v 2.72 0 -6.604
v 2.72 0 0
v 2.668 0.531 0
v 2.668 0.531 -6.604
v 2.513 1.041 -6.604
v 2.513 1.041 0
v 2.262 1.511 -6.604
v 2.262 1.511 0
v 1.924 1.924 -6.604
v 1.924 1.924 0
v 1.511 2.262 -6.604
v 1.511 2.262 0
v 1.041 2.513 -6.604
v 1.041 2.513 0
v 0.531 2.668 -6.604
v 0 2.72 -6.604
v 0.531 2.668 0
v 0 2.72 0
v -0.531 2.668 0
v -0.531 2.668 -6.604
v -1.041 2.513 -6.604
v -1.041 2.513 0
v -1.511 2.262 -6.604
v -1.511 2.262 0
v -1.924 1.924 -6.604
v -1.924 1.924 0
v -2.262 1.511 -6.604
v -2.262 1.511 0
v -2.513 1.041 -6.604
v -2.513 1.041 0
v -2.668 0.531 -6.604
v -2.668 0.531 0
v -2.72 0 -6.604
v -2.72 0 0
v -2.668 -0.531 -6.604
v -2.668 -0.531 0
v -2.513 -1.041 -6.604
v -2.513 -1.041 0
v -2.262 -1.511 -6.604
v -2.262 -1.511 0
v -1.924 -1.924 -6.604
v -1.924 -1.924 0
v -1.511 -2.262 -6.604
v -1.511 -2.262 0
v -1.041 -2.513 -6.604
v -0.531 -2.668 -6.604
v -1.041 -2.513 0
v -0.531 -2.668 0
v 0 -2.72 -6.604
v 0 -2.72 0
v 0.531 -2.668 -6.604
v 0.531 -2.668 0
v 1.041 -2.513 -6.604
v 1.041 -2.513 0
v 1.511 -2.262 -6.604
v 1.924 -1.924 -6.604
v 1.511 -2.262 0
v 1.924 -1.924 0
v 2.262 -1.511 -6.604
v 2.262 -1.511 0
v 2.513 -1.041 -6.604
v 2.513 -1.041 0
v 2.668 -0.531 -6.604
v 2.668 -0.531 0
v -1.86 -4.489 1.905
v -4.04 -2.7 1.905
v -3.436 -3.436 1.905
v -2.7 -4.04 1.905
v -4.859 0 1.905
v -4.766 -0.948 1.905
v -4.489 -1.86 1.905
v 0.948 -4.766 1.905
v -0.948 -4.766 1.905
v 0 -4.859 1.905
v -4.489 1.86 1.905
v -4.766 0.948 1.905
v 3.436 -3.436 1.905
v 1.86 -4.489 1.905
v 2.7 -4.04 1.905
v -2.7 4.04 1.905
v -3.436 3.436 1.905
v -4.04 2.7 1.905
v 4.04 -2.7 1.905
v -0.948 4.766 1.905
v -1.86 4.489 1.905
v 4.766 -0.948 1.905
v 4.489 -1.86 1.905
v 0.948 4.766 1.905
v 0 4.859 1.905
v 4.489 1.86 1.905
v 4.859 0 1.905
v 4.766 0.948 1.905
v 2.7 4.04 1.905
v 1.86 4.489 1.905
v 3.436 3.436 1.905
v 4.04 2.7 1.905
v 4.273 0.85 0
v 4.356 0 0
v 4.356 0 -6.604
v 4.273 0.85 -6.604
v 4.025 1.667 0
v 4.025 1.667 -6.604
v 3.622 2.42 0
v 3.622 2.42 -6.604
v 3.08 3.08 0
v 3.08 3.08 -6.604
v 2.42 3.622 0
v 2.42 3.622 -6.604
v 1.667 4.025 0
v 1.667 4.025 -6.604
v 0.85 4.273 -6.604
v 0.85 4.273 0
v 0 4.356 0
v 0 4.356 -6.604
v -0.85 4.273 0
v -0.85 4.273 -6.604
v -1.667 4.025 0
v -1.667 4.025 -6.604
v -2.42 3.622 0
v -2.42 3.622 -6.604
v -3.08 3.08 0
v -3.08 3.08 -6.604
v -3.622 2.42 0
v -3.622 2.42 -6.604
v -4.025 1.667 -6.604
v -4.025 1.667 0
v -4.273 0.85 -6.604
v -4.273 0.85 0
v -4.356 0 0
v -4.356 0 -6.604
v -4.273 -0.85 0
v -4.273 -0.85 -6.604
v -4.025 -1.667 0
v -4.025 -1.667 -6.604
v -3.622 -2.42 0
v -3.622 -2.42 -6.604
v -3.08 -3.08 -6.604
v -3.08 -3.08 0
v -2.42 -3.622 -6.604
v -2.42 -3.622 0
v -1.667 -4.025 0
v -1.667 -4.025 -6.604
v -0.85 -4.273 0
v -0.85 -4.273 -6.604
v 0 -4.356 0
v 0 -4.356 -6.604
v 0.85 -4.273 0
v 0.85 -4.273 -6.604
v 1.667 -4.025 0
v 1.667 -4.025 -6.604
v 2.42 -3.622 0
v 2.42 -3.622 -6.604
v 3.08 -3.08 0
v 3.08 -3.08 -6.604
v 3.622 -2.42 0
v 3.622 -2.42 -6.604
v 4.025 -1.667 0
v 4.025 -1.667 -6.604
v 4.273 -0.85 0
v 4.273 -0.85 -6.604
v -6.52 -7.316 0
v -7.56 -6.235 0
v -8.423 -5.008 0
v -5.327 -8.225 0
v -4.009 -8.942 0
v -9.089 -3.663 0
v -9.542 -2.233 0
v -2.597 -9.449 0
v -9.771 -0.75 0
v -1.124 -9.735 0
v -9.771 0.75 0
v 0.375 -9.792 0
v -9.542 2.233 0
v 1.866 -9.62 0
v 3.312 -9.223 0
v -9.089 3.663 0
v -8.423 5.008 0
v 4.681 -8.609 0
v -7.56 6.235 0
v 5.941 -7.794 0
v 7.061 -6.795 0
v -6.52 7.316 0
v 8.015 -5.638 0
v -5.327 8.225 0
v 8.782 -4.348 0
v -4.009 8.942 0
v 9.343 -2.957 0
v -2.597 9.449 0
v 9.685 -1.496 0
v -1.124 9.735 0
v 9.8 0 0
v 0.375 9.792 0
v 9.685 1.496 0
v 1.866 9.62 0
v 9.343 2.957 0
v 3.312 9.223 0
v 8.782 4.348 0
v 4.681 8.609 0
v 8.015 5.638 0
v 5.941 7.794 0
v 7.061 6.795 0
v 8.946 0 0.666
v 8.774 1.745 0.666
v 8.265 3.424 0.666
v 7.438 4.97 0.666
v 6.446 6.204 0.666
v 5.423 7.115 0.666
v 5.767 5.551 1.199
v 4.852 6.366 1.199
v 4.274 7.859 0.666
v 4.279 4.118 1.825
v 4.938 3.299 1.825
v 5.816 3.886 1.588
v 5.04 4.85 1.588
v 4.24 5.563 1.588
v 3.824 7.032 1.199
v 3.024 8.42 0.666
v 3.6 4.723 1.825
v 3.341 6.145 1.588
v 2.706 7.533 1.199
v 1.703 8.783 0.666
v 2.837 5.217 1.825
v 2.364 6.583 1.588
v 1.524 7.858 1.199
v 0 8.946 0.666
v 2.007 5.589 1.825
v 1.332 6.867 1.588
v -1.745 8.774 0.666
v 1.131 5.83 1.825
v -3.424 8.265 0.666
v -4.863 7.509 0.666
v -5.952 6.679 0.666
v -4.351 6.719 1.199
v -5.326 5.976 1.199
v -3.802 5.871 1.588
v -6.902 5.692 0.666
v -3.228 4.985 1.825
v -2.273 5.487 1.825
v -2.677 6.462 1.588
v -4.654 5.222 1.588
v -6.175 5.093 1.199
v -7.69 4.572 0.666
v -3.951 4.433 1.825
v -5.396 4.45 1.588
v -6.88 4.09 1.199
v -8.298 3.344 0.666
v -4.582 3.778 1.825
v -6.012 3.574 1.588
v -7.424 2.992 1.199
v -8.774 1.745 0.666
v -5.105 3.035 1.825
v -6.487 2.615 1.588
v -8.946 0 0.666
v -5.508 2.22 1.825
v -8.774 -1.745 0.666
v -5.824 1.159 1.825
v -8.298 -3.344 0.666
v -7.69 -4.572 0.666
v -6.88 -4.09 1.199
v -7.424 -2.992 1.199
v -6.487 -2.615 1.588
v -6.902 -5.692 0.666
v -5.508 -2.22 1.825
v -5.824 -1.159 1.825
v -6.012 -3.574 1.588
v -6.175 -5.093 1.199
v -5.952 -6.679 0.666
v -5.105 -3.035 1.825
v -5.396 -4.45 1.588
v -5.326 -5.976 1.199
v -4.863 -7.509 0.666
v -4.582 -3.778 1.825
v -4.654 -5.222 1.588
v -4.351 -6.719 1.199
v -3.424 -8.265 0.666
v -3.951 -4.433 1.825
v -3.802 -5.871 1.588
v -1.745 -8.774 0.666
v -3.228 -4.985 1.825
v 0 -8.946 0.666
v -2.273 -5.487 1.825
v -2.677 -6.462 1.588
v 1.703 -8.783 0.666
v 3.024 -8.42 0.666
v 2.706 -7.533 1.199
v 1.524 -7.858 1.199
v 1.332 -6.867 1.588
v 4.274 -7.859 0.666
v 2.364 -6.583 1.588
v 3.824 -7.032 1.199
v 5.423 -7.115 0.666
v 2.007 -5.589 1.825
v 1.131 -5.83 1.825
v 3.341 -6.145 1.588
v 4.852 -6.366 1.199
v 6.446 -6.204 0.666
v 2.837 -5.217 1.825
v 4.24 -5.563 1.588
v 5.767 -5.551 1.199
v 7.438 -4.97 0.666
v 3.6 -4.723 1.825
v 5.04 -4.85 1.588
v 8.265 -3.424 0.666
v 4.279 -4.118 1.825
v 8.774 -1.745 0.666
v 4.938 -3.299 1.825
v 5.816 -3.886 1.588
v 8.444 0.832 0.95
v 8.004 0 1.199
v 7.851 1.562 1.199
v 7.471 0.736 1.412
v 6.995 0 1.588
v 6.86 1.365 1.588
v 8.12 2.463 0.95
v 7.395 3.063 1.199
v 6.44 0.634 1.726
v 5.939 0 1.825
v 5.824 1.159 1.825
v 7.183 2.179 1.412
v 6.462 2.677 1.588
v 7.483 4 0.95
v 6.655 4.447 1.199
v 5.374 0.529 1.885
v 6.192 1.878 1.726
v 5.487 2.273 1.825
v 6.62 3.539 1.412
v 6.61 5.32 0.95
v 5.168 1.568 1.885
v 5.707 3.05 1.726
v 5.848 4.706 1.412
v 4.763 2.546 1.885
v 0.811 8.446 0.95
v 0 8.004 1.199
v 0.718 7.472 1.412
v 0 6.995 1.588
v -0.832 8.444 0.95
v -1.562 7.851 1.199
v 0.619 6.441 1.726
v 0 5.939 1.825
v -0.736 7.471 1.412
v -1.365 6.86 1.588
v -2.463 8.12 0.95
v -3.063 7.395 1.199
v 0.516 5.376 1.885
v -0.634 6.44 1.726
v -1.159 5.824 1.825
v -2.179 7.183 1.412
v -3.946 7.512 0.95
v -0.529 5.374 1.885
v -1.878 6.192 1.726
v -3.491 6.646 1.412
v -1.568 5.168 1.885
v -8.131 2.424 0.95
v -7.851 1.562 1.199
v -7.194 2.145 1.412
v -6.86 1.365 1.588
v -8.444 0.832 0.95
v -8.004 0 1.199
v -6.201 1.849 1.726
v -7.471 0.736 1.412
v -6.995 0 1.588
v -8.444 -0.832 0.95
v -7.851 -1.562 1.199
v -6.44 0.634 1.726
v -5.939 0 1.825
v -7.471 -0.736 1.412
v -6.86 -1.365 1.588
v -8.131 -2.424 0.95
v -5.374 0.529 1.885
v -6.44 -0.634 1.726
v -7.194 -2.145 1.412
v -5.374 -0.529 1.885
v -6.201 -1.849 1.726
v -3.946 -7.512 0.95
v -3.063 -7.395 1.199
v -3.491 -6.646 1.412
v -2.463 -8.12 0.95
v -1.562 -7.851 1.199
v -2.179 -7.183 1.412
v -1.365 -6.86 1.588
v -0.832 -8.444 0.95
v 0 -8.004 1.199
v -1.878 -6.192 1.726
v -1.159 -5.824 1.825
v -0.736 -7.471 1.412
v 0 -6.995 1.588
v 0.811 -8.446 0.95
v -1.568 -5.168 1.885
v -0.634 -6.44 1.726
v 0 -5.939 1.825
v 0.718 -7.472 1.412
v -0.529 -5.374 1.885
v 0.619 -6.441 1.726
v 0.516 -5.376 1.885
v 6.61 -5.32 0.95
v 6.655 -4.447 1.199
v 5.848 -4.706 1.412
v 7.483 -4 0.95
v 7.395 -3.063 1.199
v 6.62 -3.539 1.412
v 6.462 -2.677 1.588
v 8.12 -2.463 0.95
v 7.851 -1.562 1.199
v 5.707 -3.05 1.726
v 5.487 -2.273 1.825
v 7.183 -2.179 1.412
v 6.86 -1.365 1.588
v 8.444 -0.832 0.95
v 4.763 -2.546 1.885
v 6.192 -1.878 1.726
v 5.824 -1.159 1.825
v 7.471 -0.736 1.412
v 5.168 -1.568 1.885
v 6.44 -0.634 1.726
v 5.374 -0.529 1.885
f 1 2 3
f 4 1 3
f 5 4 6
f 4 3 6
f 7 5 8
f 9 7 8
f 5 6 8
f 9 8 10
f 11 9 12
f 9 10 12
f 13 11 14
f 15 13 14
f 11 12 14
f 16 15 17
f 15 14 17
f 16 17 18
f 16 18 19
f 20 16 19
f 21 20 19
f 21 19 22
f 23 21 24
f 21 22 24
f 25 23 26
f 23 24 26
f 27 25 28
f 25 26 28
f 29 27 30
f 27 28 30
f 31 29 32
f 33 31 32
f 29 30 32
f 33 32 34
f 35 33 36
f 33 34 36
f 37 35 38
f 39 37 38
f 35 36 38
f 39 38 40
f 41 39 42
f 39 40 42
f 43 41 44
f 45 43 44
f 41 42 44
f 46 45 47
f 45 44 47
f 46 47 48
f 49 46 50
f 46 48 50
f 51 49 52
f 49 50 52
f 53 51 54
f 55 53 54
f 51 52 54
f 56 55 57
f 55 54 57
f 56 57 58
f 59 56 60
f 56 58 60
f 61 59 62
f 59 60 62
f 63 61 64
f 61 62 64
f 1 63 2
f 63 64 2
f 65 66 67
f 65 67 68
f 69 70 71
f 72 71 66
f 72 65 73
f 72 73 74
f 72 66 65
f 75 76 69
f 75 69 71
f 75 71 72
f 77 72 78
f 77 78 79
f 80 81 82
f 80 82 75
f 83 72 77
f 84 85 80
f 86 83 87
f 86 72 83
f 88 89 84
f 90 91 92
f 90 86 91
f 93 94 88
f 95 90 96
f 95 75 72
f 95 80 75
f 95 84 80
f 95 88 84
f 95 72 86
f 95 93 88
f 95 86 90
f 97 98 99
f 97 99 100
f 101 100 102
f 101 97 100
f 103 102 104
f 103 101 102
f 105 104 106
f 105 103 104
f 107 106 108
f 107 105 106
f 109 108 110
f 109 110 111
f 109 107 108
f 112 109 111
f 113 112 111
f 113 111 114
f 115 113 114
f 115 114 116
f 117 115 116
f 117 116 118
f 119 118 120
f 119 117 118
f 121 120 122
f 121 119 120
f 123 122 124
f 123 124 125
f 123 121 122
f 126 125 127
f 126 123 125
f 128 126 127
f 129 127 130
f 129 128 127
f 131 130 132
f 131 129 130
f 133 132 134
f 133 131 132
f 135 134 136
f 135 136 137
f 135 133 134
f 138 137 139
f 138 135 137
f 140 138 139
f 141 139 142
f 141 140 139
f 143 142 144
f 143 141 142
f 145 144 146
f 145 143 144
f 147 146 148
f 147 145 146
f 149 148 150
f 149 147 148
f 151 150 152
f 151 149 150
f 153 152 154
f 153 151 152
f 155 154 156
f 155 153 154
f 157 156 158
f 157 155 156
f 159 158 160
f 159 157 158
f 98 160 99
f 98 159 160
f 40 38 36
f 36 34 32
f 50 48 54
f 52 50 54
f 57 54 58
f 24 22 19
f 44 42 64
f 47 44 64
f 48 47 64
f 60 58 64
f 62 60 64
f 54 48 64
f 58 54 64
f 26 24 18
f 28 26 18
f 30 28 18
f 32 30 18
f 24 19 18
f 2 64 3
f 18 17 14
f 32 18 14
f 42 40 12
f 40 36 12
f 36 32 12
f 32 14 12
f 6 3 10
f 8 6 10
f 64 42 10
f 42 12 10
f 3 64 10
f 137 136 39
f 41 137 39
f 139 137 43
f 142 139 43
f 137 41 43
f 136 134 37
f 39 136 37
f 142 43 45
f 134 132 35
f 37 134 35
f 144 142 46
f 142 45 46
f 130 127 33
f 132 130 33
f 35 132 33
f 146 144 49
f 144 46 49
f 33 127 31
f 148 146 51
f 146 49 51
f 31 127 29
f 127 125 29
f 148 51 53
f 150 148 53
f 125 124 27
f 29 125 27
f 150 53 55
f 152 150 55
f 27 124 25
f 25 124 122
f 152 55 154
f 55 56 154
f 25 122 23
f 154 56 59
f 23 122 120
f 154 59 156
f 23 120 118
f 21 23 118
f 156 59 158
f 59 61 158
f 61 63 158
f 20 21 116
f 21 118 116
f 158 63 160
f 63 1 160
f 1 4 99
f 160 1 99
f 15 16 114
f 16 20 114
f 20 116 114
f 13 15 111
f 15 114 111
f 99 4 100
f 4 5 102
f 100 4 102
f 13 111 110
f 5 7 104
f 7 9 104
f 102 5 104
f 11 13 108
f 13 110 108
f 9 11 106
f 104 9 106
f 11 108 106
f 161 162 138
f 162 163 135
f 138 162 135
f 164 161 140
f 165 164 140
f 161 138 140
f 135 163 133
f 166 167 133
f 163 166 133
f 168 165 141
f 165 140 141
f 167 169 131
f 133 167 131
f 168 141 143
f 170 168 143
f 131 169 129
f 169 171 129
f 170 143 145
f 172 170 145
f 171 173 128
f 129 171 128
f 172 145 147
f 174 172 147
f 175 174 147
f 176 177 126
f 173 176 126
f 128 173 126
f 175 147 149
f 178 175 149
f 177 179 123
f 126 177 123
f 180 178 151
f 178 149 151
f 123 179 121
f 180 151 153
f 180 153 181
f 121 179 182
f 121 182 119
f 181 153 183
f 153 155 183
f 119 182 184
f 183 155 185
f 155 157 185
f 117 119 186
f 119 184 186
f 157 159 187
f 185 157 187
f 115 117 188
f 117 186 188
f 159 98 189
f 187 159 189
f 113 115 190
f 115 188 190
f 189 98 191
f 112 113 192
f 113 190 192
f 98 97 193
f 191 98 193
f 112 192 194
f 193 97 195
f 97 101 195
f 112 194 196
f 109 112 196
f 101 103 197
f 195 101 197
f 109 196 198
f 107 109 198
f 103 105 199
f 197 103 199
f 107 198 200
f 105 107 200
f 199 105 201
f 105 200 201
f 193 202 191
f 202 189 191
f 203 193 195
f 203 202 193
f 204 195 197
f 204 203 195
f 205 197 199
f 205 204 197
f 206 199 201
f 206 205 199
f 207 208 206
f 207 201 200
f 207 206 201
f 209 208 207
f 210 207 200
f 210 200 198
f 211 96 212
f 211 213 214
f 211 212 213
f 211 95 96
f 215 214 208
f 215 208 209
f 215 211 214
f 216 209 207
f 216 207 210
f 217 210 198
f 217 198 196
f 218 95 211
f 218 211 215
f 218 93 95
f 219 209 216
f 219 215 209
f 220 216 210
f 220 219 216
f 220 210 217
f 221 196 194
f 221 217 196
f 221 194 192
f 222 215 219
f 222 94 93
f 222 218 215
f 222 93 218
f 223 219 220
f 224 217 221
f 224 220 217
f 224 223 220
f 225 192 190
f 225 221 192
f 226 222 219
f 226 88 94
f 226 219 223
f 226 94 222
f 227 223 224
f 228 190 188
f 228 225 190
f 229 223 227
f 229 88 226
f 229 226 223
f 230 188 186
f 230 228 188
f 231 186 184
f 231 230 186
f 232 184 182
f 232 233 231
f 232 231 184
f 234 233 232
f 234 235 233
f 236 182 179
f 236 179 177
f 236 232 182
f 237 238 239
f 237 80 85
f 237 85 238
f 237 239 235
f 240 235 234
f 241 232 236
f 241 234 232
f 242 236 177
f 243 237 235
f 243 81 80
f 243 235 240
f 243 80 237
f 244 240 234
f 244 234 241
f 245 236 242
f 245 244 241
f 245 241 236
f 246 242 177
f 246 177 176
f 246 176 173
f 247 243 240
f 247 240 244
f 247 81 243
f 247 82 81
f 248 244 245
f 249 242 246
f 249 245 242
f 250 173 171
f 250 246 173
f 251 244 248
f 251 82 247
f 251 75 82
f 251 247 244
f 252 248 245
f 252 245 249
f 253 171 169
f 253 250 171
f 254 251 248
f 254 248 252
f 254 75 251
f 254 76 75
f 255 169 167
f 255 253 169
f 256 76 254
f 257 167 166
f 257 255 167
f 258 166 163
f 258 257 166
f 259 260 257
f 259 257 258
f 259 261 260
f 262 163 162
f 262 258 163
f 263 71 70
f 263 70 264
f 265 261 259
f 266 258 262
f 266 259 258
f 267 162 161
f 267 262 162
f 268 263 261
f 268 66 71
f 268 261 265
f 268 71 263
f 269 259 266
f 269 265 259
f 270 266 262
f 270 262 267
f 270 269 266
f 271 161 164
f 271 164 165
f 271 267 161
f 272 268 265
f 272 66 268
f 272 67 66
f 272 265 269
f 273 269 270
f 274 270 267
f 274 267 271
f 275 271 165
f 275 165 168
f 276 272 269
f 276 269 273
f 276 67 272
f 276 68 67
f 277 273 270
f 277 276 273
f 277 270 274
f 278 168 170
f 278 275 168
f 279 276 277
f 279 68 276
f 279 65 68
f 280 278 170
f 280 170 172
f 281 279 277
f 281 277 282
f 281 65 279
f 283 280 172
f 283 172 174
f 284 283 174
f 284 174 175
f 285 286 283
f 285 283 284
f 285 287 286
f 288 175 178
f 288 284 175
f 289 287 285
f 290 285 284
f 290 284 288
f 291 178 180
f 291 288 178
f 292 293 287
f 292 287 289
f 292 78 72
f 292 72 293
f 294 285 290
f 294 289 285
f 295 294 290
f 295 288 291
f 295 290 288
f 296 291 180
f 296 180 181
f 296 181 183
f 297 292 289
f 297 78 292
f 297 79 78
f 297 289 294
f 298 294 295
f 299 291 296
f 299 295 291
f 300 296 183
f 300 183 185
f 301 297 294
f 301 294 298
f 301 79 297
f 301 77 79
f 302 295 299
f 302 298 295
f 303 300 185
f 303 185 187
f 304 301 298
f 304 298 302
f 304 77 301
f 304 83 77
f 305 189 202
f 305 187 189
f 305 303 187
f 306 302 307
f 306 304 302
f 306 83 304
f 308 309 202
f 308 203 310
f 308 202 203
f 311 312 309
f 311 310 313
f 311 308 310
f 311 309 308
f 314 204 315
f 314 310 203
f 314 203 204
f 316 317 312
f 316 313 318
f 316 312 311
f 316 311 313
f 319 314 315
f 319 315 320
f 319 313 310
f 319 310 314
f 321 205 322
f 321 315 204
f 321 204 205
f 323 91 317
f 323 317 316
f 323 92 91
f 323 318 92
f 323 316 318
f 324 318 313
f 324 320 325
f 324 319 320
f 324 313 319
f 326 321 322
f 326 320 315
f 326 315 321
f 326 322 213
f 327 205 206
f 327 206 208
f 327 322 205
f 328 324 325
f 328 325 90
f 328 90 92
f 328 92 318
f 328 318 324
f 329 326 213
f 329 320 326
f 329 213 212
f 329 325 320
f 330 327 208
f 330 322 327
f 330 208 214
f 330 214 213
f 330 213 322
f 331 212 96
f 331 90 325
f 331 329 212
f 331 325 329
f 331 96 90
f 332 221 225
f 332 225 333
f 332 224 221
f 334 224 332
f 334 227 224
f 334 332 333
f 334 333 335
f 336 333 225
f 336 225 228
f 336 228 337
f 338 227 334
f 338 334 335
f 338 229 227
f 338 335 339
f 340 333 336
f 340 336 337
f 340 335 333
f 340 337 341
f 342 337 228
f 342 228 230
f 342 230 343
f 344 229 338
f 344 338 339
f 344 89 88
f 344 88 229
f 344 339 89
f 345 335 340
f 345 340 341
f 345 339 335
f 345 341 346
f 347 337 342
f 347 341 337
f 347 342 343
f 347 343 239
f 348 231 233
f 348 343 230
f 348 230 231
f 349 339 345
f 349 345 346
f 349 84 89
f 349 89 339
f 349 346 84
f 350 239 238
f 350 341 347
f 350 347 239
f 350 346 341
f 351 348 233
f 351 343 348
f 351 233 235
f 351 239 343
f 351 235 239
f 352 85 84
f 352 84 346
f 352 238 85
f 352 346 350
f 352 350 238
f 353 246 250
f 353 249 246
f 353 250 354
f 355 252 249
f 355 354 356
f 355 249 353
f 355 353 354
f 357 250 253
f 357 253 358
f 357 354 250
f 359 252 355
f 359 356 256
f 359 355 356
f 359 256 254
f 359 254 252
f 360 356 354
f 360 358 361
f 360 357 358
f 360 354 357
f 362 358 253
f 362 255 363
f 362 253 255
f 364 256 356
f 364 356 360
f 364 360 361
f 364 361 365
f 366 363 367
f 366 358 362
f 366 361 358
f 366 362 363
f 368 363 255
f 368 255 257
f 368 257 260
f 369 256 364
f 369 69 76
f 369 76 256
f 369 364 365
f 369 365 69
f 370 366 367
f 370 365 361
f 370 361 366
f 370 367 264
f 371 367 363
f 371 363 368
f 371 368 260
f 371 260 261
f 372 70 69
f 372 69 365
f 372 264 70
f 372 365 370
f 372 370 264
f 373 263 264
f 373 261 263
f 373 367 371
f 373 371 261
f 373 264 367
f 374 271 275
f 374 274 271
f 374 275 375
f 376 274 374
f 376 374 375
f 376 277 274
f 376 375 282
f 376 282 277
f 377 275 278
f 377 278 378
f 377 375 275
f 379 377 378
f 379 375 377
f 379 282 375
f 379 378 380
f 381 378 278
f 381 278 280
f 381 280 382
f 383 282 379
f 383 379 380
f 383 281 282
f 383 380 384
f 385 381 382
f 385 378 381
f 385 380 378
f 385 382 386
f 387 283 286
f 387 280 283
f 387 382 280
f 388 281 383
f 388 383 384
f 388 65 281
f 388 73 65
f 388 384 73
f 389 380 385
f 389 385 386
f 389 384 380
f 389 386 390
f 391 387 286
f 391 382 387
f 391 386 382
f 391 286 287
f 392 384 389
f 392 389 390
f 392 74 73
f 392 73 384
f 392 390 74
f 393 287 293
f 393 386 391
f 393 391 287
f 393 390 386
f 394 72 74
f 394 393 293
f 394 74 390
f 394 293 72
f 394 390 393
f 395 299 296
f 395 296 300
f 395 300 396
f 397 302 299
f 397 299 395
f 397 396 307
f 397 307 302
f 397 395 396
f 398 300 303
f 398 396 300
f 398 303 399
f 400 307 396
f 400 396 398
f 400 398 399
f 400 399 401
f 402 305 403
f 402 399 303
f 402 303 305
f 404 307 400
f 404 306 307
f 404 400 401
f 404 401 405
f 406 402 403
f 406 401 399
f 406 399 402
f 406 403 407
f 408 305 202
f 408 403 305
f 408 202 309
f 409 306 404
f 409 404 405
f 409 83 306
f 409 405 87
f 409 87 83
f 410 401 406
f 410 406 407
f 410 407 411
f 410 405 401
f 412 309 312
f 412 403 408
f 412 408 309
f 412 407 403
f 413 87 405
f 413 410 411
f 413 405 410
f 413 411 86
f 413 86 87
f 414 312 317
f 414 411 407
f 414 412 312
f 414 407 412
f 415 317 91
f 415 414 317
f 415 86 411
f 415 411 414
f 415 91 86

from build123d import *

# Parameters (mm, degrees)
F0_R     = 9.7995430213
F0_R_2   = 4.3563305412
F1_DEPTH = 1.905
F0_R_3   = 2.7204723389
F2_DEPTH = 1.905
F3_DEPTH = 6.604


# Not quite as in the source:
# - a fillet or chamfer that OpenCascade refuses, or shapes differently, is made with other operations: its cross-section is extruded or revolved along the edge and cut away or added


with BuildPart() as f1:
    # F0 (on Top) → F1 (new body)
    with BuildSketch(Plane.XY):
        Circle(F0_R)
        Circle(F0_R_2, mode=Mode.SUBTRACT)
    extrude(amount=F1_DEPTH)

    # F0 (on Top) → F2 (join)
    with BuildSketch(Plane.XY):
        Circle(F0_R_2)
        Circle(F0_R_3, mode=Mode.SUBTRACT)
        Circle(F0_R_3)
    extrude(amount=F2_DEPTH)

    # F0 (on Top) → F3 (join)
    with BuildSketch(Plane.XY):
        Circle(F0_R_2)
        Circle(F0_R_3, mode=Mode.SUBTRACT)
    extrude(amount=-F3_DEPTH)

    # F4: fillet of radius 7.3585229381 on 1 edges, made by hand

    # F4_s1 → F4_t2 (revolve, cut)
    with BuildSketch(Plane.XZ):
        with BuildLine():
            ThreePointArc((9.7995430213, 0), (7.5066545293, 1.4122520897), (4.8592042279, 1.905))
            Line((4.8592042279, 1.905), (9.7995430213, 1.905))
            Line((9.7995430213, 1.905), (9.7995430213, 0))
        make_face()
    revolve(axis=Axis((0, 0, 1.905), (0, 0, 1)), mode=Mode.SUBTRACT)


solid = f1.part
